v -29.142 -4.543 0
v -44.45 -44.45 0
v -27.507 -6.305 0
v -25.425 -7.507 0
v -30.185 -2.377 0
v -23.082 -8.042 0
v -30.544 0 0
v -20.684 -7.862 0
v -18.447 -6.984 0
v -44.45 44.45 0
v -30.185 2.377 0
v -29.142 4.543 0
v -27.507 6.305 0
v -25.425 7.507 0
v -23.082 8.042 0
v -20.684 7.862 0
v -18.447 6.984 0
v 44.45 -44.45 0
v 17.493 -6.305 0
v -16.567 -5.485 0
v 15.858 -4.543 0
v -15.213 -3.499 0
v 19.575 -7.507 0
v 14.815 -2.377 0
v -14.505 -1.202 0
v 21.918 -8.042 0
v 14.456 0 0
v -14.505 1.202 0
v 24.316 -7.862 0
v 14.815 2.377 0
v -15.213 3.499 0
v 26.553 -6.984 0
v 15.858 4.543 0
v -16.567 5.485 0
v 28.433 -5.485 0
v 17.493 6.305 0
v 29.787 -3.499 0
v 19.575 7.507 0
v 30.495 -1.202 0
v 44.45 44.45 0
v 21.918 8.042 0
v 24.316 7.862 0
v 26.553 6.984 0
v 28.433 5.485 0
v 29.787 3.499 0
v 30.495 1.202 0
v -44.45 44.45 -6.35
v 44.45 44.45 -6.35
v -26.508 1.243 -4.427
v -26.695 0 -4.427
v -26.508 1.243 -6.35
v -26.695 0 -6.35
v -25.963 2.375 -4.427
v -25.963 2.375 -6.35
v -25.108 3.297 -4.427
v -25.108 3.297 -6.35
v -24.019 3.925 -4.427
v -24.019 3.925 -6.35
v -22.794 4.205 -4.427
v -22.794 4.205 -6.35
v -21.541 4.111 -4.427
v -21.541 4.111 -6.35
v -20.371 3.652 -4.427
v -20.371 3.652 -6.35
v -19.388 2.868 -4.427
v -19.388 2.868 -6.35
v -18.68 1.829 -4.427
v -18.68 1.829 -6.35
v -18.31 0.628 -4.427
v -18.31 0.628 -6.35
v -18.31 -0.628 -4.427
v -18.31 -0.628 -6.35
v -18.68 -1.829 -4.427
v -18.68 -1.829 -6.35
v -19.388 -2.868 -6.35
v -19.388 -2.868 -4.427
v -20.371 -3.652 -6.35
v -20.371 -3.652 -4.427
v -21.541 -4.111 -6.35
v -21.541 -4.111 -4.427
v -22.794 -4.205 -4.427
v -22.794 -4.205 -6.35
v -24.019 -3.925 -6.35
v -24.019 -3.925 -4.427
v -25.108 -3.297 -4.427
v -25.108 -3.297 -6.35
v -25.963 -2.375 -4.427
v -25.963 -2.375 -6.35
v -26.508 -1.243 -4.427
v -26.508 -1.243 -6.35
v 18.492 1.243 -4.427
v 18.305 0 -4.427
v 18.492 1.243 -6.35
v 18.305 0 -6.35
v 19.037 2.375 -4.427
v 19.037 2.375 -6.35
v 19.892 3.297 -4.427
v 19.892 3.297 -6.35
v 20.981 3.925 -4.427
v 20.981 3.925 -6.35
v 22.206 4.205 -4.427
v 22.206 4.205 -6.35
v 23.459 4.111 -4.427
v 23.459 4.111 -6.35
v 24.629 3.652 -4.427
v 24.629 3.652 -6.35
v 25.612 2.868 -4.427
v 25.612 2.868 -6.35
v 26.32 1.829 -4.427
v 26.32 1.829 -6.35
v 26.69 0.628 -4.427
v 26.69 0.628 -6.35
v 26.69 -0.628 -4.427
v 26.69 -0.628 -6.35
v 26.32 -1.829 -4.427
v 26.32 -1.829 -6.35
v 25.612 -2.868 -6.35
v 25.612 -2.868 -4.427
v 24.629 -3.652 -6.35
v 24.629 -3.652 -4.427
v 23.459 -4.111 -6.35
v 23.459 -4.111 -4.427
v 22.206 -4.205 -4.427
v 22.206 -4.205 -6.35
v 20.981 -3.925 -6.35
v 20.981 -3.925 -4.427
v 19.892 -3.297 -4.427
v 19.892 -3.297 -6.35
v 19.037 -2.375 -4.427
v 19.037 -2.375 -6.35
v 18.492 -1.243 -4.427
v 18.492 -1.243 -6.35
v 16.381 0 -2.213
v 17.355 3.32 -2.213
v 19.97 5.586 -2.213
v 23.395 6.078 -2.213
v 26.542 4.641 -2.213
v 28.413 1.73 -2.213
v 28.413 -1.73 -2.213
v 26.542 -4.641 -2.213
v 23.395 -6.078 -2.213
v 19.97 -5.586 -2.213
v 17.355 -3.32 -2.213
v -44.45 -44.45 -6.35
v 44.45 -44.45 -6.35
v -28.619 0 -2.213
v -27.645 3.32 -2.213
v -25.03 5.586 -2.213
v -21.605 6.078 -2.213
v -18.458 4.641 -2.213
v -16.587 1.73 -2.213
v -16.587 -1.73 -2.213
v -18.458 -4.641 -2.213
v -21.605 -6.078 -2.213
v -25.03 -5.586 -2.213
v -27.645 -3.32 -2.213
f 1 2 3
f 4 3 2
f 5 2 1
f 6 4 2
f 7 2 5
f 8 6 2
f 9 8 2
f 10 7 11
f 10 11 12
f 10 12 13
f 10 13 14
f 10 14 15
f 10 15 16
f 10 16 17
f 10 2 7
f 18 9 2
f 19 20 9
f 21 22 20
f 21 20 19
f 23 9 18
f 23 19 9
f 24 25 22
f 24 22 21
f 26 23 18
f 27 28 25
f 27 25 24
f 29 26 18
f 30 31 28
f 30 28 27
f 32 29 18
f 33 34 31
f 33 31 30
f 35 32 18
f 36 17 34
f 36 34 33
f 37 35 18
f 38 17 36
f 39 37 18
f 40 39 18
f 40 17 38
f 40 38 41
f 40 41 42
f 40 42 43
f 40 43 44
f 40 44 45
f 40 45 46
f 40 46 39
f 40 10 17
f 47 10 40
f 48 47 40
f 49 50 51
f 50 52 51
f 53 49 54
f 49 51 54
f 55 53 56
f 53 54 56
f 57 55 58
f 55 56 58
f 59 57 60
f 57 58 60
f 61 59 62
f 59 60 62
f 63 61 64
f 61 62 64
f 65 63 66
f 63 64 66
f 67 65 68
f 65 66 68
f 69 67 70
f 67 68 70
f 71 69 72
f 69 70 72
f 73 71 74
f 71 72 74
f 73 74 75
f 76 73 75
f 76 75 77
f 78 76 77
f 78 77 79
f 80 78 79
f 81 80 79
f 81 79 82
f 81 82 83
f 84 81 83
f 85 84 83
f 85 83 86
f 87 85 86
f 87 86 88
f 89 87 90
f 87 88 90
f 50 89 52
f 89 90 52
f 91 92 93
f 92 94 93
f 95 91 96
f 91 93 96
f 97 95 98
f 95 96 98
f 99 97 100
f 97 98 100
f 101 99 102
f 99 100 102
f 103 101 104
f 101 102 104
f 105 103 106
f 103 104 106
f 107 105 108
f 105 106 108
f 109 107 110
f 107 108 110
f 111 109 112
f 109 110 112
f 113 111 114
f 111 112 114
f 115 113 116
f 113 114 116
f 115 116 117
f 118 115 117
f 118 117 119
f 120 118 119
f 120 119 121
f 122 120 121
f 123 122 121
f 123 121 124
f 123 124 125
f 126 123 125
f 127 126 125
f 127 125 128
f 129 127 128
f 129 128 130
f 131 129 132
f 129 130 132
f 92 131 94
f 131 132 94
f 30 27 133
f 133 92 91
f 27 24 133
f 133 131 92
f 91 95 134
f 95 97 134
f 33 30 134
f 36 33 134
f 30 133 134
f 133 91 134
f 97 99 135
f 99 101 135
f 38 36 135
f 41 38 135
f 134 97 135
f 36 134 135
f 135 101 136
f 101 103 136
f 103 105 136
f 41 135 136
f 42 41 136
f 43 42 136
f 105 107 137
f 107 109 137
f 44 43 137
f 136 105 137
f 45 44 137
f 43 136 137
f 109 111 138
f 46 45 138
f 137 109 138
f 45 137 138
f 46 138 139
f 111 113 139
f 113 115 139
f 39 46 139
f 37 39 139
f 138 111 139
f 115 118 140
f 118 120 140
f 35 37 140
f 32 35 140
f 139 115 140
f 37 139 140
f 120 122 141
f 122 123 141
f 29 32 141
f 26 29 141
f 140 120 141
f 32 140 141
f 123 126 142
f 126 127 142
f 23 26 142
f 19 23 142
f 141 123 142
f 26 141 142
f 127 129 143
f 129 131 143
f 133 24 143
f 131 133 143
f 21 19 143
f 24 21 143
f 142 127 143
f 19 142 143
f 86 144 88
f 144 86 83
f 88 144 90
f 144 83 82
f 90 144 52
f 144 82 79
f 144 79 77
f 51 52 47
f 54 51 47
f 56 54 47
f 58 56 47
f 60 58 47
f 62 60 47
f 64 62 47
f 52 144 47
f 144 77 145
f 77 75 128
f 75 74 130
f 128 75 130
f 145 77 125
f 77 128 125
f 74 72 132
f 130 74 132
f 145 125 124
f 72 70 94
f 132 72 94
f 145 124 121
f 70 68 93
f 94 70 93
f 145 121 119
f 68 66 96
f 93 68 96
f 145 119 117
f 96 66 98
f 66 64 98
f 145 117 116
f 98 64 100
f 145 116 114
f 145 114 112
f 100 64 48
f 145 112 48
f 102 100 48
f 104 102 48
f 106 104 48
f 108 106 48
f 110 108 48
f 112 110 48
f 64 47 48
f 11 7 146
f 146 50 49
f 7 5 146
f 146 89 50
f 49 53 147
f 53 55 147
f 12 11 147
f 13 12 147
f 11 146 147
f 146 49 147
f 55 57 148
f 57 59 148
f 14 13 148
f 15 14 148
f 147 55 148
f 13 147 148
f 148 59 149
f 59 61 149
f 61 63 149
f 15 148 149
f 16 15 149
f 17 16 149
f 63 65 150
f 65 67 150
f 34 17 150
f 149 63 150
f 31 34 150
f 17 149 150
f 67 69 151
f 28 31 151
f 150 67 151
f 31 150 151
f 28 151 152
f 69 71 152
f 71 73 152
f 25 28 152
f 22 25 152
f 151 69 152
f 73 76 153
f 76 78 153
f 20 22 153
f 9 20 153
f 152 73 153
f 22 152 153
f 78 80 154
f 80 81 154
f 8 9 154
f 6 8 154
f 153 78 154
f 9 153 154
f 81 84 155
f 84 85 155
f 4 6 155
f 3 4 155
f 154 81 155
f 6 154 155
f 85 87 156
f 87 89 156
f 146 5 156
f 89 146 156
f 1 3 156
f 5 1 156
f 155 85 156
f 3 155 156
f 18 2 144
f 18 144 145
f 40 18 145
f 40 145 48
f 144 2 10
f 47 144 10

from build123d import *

# Parameters (mm, degrees)
SKETCH1_W                                         = 88.9
SKETCH1_H                                         = 88.9
SKETCH1_R                                         = 4.191
SKETCH1_R_2                                       = 4.15
BOSS_EXTRUDE1_DEPTH                               = 6.35
CSK_FOR_5_16_FLAT_HEAD_MACHINE_SCREW1_D           = 8.4328
CSK_FOR_5_16_FLAT_HEAD_MACHINE_SCREW1_DEPTH       = 32.766
CSK_FOR_5_16_FLAT_HEAD_MACHINE_SCREW1_CSINK_D     = 16.129
CSK_FOR_5_16_FLAT_HEAD_MACHINE_SCREW1_CSINK_ANGLE = 82
CSK_FOR_5_16_FLAT_HEAD_MACHINE_SCREW1_TIP         = 2.533468714


with BuildPart() as part:
    # Sketch1 → Boss-Extrude1 (new body)
    with BuildSketch(Plane.XY):
        Rectangle(SKETCH1_W, SKETCH1_H)
        with Locations((-22.479, 0)):
            Circle(SKETCH1_R, mode=Mode.SUBTRACT)
        with Locations((22.521, 0)):
            Circle(SKETCH1_R_2, mode=Mode.SUBTRACT)
    extrude(amount=-BOSS_EXTRUDE1_DEPTH)

    # CSK for 5/16 Flat Head Machine Screw1
    with Locations(Plane(origin=(-22.479, 0, 0), x_dir=(1, 0, 0), z_dir=(0, 0, 1))):
        with Locations((0, 0), (45, 0)):
            CounterSinkHole(CSK_FOR_5_16_FLAT_HEAD_MACHINE_SCREW1_D / 2, CSK_FOR_5_16_FLAT_HEAD_MACHINE_SCREW1_CSINK_D / 2, depth=CSK_FOR_5_16_FLAT_HEAD_MACHINE_SCREW1_DEPTH, counter_sink_angle=CSK_FOR_5_16_FLAT_HEAD_MACHINE_SCREW1_CSINK_ANGLE)
            with Locations((0, 0, -(CSK_FOR_5_16_FLAT_HEAD_MACHINE_SCREW1_DEPTH + CSK_FOR_5_16_FLAT_HEAD_MACHINE_SCREW1_TIP / 2))):  # 118° drill point
                Cone(0, CSK_FOR_5_16_FLAT_HEAD_MACHINE_SCREW1_D / 2, CSK_FOR_5_16_FLAT_HEAD_MACHINE_SCREW1_TIP, mode=Mode.SUBTRACT)


solid = part.part
